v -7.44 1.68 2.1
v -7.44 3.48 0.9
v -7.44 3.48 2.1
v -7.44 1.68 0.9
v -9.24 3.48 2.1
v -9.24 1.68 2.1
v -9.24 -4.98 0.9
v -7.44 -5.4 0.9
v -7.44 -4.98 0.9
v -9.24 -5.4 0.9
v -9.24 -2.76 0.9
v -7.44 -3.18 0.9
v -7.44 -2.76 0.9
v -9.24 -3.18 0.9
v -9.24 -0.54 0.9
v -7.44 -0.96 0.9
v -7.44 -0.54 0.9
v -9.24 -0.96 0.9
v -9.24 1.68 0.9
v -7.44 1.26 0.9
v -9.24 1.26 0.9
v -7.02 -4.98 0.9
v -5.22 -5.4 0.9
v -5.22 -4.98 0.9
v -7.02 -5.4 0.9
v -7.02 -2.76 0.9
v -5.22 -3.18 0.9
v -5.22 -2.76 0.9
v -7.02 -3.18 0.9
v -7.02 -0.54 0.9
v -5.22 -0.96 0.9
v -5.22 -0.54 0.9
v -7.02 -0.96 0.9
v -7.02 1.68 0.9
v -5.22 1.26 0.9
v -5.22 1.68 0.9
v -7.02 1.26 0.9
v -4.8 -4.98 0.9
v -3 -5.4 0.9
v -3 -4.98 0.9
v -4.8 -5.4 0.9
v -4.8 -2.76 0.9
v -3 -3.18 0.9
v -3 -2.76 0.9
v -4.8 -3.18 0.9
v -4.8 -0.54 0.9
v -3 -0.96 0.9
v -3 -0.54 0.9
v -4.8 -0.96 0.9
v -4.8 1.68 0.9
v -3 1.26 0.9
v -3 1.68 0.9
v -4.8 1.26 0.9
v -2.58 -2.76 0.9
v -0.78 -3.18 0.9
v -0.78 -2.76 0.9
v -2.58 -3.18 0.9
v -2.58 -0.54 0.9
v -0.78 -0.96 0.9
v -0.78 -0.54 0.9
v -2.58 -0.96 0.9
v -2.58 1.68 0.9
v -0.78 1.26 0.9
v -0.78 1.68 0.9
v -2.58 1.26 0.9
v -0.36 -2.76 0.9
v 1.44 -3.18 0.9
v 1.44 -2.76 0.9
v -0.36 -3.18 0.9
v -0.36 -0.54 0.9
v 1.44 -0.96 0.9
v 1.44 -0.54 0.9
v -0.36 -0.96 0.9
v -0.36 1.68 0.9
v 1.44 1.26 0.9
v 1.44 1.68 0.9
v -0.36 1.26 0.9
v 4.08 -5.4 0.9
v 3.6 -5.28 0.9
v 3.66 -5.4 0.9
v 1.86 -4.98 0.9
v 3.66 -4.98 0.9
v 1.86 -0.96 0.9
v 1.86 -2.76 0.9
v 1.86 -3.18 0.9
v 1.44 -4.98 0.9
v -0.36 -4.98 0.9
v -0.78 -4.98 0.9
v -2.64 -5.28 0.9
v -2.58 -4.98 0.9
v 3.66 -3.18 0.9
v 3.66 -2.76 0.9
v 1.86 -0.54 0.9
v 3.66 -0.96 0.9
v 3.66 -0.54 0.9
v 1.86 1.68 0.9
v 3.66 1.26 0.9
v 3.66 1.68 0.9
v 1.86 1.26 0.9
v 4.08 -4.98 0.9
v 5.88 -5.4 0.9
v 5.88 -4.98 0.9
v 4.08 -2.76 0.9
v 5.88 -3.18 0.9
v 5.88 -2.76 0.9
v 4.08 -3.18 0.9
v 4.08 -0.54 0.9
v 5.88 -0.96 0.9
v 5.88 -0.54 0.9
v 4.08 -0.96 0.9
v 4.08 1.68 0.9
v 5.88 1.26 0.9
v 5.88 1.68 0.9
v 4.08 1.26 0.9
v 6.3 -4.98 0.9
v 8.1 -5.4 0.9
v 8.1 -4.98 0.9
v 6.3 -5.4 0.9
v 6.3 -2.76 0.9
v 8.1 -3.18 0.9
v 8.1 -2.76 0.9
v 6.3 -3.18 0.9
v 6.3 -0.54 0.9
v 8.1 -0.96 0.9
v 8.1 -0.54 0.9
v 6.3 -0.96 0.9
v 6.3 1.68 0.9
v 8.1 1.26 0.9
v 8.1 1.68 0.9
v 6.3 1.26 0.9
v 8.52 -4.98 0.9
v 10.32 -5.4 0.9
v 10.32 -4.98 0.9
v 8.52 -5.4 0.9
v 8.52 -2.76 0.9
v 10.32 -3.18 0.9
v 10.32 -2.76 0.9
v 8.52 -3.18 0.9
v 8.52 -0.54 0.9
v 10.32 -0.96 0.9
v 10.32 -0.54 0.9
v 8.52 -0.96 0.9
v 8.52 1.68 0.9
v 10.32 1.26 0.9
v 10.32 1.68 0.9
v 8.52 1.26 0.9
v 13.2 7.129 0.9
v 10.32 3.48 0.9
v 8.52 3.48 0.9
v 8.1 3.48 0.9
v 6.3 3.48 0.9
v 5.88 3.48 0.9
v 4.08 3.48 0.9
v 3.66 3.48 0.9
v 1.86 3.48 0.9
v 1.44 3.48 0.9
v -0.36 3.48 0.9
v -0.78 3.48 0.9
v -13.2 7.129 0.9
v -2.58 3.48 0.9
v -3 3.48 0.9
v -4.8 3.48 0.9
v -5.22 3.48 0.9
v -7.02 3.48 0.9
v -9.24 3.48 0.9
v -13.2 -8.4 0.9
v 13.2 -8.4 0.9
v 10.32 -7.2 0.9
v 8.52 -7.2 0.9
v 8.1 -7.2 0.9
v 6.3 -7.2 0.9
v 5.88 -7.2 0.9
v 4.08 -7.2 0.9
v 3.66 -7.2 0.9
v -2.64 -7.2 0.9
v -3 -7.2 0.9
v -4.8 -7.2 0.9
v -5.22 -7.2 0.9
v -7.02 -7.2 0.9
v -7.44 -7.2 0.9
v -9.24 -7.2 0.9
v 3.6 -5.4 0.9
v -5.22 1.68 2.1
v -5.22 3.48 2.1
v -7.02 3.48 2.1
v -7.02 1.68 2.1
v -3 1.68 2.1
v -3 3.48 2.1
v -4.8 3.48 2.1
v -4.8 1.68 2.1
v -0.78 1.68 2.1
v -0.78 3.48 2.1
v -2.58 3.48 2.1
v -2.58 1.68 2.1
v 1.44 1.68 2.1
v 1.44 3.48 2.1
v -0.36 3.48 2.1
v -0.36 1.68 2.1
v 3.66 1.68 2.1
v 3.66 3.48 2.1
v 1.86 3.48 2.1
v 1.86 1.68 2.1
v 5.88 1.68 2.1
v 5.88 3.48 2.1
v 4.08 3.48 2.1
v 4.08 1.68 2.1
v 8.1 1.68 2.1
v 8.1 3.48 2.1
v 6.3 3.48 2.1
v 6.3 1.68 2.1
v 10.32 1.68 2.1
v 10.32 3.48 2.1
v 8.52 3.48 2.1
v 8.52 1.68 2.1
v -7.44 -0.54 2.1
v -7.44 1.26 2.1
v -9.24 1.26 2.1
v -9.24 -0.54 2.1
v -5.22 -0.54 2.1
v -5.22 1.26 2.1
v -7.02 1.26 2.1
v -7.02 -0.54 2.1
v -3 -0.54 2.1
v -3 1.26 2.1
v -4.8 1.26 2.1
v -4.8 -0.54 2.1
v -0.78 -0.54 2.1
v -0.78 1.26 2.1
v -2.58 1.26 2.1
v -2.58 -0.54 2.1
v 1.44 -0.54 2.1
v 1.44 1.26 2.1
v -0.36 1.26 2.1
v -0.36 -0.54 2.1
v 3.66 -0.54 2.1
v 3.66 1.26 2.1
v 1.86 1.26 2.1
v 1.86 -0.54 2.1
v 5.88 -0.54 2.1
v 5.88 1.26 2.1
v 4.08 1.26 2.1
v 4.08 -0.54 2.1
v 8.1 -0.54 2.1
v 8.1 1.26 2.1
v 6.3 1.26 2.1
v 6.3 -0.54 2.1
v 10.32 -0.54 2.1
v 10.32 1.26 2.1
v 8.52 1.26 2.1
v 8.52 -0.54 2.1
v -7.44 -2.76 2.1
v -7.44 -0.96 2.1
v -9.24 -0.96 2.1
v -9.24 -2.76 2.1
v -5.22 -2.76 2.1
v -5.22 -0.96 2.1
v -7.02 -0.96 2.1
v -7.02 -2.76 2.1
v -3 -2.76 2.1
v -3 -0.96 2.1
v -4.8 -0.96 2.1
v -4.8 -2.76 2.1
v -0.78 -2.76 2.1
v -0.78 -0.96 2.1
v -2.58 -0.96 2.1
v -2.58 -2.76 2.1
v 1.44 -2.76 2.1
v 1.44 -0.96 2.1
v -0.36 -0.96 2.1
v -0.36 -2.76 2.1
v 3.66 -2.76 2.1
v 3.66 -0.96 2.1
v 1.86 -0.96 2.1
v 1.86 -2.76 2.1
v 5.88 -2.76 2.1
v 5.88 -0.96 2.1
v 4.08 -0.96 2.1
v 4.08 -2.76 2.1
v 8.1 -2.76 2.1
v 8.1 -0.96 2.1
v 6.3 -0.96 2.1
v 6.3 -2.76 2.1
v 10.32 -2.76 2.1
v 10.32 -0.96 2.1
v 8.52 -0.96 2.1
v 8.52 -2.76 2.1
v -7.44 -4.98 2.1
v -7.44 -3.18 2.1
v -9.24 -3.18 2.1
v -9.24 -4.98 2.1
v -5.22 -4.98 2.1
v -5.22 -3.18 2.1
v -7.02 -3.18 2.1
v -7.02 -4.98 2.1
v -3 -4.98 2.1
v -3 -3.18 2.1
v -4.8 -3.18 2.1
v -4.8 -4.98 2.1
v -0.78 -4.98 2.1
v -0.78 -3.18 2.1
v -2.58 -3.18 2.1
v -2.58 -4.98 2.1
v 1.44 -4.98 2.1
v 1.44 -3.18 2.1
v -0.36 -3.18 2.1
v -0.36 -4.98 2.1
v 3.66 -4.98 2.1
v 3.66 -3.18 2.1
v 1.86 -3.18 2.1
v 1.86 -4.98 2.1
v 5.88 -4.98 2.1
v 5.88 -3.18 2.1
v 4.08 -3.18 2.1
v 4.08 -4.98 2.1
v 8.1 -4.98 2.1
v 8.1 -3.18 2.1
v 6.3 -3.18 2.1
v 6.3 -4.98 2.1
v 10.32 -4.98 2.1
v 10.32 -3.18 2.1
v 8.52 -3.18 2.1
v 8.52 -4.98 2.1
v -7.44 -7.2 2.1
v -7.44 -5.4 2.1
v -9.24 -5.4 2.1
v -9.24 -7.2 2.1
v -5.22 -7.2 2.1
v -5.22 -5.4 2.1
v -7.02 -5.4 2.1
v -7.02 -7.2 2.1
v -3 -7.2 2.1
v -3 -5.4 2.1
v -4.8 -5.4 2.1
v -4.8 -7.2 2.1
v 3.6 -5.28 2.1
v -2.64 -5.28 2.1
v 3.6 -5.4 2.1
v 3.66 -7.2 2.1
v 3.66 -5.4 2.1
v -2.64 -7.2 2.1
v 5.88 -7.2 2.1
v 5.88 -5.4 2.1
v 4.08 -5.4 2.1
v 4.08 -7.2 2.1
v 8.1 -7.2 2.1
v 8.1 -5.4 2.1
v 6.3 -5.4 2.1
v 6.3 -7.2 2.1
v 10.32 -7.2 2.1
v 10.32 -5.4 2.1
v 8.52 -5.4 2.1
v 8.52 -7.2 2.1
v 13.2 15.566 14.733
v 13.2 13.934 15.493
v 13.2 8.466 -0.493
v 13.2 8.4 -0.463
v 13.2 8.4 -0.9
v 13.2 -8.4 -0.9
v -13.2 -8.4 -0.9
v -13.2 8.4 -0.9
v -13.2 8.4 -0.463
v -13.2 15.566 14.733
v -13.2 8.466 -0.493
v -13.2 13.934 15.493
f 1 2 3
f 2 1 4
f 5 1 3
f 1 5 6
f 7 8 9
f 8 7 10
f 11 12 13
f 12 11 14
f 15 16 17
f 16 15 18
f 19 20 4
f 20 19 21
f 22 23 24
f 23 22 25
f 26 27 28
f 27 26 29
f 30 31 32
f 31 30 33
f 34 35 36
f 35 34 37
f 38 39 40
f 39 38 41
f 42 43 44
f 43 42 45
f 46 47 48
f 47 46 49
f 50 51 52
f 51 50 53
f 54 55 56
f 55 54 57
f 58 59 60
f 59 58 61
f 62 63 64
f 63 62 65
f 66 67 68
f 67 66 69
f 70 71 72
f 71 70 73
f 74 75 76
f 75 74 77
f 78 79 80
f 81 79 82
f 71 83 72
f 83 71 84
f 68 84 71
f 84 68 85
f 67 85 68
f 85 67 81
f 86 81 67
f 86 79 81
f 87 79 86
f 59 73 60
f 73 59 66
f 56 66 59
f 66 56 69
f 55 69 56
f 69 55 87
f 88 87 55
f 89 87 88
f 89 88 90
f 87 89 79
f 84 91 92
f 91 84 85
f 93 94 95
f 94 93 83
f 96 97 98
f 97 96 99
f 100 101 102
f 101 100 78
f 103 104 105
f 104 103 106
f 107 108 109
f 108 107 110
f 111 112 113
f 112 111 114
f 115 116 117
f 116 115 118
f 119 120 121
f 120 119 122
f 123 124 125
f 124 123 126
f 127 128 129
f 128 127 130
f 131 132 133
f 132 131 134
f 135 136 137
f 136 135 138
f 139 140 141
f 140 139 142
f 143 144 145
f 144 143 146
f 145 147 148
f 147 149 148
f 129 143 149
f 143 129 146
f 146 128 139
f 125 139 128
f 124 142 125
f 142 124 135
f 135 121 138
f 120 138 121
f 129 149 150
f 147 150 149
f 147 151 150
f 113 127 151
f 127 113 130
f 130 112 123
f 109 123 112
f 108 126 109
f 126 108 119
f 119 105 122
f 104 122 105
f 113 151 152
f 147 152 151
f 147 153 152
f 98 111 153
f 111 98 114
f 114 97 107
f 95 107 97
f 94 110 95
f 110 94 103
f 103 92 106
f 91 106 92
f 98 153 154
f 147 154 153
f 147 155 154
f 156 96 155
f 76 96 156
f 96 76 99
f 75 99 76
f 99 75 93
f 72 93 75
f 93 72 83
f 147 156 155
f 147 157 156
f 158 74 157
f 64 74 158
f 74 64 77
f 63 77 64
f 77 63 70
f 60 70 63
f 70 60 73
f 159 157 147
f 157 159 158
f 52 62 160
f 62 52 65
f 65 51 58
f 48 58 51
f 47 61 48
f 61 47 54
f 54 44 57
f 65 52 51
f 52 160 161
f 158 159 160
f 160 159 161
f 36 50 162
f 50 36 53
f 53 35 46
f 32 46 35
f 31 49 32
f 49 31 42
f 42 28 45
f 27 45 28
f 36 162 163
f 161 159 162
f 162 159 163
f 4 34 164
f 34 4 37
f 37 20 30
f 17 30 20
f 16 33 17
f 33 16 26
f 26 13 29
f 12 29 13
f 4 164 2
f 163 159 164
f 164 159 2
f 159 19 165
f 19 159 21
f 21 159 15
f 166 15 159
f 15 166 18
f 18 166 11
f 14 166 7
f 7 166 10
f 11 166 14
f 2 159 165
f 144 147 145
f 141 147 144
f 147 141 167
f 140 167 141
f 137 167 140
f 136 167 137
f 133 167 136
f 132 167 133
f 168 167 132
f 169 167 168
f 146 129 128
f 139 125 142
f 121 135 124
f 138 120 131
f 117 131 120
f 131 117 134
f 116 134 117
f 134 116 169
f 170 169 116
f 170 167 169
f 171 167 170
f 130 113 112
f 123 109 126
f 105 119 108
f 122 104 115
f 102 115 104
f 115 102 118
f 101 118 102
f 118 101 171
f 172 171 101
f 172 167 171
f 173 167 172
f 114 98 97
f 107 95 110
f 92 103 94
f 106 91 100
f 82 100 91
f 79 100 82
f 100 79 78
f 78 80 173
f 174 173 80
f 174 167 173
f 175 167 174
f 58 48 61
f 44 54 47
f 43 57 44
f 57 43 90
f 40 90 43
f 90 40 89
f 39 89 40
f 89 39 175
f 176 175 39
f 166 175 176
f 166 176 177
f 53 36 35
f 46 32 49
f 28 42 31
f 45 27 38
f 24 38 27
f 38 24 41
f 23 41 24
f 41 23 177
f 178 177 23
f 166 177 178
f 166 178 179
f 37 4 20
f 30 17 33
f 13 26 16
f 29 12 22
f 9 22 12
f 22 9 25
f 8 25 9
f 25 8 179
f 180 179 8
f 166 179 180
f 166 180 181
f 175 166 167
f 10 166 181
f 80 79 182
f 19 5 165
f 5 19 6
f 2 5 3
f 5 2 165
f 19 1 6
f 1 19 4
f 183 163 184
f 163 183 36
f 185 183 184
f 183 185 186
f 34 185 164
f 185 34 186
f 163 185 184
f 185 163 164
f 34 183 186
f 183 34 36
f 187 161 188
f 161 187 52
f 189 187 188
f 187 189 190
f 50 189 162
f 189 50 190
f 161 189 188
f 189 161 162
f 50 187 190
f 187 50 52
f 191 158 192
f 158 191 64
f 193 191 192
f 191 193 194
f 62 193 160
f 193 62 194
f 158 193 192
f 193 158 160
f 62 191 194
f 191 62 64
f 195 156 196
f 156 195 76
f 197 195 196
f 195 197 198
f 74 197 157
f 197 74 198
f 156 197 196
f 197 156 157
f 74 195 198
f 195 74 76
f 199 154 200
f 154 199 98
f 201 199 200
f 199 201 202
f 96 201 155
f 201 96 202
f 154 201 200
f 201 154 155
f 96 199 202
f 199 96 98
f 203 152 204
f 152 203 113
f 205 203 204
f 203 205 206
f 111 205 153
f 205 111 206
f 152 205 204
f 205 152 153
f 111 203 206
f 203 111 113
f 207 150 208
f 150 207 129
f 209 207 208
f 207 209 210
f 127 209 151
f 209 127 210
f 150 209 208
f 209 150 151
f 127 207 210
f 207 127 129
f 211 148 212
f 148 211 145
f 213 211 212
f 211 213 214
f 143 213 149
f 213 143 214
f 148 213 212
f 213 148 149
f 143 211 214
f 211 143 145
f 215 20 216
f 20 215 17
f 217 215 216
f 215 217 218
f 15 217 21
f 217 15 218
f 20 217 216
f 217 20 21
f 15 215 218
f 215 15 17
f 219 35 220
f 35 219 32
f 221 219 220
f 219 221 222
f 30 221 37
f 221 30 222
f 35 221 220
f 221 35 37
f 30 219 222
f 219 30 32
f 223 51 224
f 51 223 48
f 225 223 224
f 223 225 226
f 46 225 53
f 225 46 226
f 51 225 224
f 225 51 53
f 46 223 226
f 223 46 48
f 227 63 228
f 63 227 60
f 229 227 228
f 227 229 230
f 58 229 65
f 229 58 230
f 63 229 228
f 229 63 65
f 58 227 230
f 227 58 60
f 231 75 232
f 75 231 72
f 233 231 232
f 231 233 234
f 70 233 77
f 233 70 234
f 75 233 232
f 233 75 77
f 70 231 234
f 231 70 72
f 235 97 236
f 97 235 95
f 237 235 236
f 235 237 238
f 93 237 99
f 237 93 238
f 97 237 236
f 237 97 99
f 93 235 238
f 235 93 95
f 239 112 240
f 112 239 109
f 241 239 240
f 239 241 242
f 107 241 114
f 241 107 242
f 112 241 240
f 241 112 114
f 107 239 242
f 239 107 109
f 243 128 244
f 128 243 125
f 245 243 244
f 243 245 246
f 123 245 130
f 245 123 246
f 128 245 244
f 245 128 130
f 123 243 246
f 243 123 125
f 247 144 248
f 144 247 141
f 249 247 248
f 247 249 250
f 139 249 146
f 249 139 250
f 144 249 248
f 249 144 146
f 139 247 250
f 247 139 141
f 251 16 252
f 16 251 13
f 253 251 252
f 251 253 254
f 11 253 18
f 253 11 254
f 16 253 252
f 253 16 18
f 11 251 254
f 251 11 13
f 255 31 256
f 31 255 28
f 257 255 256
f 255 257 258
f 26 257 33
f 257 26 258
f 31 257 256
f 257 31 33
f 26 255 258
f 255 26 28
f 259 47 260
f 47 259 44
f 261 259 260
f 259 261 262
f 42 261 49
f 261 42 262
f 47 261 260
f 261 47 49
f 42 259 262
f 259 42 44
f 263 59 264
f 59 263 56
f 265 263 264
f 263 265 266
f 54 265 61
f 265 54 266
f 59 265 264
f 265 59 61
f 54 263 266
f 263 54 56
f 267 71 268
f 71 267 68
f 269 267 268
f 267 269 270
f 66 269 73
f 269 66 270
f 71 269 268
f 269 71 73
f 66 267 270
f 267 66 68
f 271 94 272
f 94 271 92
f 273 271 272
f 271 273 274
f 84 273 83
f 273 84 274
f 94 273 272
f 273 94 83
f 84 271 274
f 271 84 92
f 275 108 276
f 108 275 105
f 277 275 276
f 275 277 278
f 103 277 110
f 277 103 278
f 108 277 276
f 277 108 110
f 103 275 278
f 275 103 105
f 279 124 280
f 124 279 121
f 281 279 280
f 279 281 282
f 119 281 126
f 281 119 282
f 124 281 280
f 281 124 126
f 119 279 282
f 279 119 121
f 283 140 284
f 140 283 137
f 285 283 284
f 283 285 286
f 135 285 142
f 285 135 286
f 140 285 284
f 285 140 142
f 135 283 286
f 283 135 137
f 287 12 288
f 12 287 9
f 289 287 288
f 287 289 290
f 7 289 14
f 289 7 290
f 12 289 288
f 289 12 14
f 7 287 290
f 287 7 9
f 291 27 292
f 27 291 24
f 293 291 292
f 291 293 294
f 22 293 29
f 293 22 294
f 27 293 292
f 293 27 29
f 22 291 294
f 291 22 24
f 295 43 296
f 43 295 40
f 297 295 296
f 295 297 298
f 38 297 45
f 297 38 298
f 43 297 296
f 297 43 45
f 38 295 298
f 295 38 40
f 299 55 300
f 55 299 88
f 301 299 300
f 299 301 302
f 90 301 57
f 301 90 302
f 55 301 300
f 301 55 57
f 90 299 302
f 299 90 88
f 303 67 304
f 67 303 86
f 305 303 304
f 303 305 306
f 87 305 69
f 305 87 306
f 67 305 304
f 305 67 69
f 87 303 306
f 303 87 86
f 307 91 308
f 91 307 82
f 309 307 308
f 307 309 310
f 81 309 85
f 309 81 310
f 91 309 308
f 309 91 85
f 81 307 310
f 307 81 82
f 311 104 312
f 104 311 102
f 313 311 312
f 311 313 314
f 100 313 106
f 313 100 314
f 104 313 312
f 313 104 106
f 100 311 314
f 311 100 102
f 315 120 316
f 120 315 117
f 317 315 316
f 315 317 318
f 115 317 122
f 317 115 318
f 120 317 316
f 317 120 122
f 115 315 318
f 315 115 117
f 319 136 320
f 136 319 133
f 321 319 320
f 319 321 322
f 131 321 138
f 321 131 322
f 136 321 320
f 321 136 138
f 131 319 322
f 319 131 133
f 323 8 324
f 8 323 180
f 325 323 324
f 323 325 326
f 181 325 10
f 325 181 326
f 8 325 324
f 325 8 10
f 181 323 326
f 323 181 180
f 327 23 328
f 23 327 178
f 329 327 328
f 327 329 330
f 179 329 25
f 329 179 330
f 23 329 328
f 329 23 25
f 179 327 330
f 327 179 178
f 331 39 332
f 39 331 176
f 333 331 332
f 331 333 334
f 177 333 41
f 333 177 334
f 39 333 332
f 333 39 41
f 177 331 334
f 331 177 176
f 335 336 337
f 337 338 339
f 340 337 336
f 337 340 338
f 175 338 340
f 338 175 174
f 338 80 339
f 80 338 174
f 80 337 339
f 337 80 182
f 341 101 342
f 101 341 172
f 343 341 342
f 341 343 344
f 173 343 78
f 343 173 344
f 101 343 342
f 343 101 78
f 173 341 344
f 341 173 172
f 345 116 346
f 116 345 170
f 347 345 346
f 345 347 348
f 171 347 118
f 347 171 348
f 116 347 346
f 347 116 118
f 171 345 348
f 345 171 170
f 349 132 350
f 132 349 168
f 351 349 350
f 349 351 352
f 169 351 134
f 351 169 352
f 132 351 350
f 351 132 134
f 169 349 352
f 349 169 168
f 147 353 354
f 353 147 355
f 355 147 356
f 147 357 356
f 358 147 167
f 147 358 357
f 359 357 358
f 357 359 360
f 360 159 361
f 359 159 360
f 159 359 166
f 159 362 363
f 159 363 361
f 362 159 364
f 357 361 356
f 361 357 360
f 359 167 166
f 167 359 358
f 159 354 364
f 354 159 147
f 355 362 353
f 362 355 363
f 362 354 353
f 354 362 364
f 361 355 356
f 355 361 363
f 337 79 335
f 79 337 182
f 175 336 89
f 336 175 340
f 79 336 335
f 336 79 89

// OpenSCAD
bganX = 22;
bganY = 14;
bganZ = 1.5;
keyX = 1.5;
keyY = 1.5;
keyZ = 1;
keySpacing = 0.35;
keyStartingY = 4;

startX = -8.8;

module keyRow() {
    for(i=[1:9]) {
        translate([startX + (i*(keyX+keySpacing)),0,(bganZ/2)+(keyZ/2)]) {
            cube([keyX, keyY, keyZ], true);
        }
    }
}
scale([1.2, 1.2, 1.2]) {
    union() {
        cube([bganX,bganY,bganZ], true);
        translate([0,(bganY/1.5),(bganY/2)-bganZ*.5]) {
            rotate([65,0,0]) {
                cube([bganX,bganY,bganZ], true);
            }
        }
        for(j=[1:5]) {
            translate([0,keyStartingY+(j*(-(keyY+keySpacing))),0]) {
                keyRow();
            }
        }
        #translate([keyX/2-keySpacing,-3*(keyY+keySpacing)+keySpacing,(bganZ/2)+(keyZ/2)]) cube([(keyX*3)+(keySpacing*2), keyY+.1, keyZ], true);
    }
}
